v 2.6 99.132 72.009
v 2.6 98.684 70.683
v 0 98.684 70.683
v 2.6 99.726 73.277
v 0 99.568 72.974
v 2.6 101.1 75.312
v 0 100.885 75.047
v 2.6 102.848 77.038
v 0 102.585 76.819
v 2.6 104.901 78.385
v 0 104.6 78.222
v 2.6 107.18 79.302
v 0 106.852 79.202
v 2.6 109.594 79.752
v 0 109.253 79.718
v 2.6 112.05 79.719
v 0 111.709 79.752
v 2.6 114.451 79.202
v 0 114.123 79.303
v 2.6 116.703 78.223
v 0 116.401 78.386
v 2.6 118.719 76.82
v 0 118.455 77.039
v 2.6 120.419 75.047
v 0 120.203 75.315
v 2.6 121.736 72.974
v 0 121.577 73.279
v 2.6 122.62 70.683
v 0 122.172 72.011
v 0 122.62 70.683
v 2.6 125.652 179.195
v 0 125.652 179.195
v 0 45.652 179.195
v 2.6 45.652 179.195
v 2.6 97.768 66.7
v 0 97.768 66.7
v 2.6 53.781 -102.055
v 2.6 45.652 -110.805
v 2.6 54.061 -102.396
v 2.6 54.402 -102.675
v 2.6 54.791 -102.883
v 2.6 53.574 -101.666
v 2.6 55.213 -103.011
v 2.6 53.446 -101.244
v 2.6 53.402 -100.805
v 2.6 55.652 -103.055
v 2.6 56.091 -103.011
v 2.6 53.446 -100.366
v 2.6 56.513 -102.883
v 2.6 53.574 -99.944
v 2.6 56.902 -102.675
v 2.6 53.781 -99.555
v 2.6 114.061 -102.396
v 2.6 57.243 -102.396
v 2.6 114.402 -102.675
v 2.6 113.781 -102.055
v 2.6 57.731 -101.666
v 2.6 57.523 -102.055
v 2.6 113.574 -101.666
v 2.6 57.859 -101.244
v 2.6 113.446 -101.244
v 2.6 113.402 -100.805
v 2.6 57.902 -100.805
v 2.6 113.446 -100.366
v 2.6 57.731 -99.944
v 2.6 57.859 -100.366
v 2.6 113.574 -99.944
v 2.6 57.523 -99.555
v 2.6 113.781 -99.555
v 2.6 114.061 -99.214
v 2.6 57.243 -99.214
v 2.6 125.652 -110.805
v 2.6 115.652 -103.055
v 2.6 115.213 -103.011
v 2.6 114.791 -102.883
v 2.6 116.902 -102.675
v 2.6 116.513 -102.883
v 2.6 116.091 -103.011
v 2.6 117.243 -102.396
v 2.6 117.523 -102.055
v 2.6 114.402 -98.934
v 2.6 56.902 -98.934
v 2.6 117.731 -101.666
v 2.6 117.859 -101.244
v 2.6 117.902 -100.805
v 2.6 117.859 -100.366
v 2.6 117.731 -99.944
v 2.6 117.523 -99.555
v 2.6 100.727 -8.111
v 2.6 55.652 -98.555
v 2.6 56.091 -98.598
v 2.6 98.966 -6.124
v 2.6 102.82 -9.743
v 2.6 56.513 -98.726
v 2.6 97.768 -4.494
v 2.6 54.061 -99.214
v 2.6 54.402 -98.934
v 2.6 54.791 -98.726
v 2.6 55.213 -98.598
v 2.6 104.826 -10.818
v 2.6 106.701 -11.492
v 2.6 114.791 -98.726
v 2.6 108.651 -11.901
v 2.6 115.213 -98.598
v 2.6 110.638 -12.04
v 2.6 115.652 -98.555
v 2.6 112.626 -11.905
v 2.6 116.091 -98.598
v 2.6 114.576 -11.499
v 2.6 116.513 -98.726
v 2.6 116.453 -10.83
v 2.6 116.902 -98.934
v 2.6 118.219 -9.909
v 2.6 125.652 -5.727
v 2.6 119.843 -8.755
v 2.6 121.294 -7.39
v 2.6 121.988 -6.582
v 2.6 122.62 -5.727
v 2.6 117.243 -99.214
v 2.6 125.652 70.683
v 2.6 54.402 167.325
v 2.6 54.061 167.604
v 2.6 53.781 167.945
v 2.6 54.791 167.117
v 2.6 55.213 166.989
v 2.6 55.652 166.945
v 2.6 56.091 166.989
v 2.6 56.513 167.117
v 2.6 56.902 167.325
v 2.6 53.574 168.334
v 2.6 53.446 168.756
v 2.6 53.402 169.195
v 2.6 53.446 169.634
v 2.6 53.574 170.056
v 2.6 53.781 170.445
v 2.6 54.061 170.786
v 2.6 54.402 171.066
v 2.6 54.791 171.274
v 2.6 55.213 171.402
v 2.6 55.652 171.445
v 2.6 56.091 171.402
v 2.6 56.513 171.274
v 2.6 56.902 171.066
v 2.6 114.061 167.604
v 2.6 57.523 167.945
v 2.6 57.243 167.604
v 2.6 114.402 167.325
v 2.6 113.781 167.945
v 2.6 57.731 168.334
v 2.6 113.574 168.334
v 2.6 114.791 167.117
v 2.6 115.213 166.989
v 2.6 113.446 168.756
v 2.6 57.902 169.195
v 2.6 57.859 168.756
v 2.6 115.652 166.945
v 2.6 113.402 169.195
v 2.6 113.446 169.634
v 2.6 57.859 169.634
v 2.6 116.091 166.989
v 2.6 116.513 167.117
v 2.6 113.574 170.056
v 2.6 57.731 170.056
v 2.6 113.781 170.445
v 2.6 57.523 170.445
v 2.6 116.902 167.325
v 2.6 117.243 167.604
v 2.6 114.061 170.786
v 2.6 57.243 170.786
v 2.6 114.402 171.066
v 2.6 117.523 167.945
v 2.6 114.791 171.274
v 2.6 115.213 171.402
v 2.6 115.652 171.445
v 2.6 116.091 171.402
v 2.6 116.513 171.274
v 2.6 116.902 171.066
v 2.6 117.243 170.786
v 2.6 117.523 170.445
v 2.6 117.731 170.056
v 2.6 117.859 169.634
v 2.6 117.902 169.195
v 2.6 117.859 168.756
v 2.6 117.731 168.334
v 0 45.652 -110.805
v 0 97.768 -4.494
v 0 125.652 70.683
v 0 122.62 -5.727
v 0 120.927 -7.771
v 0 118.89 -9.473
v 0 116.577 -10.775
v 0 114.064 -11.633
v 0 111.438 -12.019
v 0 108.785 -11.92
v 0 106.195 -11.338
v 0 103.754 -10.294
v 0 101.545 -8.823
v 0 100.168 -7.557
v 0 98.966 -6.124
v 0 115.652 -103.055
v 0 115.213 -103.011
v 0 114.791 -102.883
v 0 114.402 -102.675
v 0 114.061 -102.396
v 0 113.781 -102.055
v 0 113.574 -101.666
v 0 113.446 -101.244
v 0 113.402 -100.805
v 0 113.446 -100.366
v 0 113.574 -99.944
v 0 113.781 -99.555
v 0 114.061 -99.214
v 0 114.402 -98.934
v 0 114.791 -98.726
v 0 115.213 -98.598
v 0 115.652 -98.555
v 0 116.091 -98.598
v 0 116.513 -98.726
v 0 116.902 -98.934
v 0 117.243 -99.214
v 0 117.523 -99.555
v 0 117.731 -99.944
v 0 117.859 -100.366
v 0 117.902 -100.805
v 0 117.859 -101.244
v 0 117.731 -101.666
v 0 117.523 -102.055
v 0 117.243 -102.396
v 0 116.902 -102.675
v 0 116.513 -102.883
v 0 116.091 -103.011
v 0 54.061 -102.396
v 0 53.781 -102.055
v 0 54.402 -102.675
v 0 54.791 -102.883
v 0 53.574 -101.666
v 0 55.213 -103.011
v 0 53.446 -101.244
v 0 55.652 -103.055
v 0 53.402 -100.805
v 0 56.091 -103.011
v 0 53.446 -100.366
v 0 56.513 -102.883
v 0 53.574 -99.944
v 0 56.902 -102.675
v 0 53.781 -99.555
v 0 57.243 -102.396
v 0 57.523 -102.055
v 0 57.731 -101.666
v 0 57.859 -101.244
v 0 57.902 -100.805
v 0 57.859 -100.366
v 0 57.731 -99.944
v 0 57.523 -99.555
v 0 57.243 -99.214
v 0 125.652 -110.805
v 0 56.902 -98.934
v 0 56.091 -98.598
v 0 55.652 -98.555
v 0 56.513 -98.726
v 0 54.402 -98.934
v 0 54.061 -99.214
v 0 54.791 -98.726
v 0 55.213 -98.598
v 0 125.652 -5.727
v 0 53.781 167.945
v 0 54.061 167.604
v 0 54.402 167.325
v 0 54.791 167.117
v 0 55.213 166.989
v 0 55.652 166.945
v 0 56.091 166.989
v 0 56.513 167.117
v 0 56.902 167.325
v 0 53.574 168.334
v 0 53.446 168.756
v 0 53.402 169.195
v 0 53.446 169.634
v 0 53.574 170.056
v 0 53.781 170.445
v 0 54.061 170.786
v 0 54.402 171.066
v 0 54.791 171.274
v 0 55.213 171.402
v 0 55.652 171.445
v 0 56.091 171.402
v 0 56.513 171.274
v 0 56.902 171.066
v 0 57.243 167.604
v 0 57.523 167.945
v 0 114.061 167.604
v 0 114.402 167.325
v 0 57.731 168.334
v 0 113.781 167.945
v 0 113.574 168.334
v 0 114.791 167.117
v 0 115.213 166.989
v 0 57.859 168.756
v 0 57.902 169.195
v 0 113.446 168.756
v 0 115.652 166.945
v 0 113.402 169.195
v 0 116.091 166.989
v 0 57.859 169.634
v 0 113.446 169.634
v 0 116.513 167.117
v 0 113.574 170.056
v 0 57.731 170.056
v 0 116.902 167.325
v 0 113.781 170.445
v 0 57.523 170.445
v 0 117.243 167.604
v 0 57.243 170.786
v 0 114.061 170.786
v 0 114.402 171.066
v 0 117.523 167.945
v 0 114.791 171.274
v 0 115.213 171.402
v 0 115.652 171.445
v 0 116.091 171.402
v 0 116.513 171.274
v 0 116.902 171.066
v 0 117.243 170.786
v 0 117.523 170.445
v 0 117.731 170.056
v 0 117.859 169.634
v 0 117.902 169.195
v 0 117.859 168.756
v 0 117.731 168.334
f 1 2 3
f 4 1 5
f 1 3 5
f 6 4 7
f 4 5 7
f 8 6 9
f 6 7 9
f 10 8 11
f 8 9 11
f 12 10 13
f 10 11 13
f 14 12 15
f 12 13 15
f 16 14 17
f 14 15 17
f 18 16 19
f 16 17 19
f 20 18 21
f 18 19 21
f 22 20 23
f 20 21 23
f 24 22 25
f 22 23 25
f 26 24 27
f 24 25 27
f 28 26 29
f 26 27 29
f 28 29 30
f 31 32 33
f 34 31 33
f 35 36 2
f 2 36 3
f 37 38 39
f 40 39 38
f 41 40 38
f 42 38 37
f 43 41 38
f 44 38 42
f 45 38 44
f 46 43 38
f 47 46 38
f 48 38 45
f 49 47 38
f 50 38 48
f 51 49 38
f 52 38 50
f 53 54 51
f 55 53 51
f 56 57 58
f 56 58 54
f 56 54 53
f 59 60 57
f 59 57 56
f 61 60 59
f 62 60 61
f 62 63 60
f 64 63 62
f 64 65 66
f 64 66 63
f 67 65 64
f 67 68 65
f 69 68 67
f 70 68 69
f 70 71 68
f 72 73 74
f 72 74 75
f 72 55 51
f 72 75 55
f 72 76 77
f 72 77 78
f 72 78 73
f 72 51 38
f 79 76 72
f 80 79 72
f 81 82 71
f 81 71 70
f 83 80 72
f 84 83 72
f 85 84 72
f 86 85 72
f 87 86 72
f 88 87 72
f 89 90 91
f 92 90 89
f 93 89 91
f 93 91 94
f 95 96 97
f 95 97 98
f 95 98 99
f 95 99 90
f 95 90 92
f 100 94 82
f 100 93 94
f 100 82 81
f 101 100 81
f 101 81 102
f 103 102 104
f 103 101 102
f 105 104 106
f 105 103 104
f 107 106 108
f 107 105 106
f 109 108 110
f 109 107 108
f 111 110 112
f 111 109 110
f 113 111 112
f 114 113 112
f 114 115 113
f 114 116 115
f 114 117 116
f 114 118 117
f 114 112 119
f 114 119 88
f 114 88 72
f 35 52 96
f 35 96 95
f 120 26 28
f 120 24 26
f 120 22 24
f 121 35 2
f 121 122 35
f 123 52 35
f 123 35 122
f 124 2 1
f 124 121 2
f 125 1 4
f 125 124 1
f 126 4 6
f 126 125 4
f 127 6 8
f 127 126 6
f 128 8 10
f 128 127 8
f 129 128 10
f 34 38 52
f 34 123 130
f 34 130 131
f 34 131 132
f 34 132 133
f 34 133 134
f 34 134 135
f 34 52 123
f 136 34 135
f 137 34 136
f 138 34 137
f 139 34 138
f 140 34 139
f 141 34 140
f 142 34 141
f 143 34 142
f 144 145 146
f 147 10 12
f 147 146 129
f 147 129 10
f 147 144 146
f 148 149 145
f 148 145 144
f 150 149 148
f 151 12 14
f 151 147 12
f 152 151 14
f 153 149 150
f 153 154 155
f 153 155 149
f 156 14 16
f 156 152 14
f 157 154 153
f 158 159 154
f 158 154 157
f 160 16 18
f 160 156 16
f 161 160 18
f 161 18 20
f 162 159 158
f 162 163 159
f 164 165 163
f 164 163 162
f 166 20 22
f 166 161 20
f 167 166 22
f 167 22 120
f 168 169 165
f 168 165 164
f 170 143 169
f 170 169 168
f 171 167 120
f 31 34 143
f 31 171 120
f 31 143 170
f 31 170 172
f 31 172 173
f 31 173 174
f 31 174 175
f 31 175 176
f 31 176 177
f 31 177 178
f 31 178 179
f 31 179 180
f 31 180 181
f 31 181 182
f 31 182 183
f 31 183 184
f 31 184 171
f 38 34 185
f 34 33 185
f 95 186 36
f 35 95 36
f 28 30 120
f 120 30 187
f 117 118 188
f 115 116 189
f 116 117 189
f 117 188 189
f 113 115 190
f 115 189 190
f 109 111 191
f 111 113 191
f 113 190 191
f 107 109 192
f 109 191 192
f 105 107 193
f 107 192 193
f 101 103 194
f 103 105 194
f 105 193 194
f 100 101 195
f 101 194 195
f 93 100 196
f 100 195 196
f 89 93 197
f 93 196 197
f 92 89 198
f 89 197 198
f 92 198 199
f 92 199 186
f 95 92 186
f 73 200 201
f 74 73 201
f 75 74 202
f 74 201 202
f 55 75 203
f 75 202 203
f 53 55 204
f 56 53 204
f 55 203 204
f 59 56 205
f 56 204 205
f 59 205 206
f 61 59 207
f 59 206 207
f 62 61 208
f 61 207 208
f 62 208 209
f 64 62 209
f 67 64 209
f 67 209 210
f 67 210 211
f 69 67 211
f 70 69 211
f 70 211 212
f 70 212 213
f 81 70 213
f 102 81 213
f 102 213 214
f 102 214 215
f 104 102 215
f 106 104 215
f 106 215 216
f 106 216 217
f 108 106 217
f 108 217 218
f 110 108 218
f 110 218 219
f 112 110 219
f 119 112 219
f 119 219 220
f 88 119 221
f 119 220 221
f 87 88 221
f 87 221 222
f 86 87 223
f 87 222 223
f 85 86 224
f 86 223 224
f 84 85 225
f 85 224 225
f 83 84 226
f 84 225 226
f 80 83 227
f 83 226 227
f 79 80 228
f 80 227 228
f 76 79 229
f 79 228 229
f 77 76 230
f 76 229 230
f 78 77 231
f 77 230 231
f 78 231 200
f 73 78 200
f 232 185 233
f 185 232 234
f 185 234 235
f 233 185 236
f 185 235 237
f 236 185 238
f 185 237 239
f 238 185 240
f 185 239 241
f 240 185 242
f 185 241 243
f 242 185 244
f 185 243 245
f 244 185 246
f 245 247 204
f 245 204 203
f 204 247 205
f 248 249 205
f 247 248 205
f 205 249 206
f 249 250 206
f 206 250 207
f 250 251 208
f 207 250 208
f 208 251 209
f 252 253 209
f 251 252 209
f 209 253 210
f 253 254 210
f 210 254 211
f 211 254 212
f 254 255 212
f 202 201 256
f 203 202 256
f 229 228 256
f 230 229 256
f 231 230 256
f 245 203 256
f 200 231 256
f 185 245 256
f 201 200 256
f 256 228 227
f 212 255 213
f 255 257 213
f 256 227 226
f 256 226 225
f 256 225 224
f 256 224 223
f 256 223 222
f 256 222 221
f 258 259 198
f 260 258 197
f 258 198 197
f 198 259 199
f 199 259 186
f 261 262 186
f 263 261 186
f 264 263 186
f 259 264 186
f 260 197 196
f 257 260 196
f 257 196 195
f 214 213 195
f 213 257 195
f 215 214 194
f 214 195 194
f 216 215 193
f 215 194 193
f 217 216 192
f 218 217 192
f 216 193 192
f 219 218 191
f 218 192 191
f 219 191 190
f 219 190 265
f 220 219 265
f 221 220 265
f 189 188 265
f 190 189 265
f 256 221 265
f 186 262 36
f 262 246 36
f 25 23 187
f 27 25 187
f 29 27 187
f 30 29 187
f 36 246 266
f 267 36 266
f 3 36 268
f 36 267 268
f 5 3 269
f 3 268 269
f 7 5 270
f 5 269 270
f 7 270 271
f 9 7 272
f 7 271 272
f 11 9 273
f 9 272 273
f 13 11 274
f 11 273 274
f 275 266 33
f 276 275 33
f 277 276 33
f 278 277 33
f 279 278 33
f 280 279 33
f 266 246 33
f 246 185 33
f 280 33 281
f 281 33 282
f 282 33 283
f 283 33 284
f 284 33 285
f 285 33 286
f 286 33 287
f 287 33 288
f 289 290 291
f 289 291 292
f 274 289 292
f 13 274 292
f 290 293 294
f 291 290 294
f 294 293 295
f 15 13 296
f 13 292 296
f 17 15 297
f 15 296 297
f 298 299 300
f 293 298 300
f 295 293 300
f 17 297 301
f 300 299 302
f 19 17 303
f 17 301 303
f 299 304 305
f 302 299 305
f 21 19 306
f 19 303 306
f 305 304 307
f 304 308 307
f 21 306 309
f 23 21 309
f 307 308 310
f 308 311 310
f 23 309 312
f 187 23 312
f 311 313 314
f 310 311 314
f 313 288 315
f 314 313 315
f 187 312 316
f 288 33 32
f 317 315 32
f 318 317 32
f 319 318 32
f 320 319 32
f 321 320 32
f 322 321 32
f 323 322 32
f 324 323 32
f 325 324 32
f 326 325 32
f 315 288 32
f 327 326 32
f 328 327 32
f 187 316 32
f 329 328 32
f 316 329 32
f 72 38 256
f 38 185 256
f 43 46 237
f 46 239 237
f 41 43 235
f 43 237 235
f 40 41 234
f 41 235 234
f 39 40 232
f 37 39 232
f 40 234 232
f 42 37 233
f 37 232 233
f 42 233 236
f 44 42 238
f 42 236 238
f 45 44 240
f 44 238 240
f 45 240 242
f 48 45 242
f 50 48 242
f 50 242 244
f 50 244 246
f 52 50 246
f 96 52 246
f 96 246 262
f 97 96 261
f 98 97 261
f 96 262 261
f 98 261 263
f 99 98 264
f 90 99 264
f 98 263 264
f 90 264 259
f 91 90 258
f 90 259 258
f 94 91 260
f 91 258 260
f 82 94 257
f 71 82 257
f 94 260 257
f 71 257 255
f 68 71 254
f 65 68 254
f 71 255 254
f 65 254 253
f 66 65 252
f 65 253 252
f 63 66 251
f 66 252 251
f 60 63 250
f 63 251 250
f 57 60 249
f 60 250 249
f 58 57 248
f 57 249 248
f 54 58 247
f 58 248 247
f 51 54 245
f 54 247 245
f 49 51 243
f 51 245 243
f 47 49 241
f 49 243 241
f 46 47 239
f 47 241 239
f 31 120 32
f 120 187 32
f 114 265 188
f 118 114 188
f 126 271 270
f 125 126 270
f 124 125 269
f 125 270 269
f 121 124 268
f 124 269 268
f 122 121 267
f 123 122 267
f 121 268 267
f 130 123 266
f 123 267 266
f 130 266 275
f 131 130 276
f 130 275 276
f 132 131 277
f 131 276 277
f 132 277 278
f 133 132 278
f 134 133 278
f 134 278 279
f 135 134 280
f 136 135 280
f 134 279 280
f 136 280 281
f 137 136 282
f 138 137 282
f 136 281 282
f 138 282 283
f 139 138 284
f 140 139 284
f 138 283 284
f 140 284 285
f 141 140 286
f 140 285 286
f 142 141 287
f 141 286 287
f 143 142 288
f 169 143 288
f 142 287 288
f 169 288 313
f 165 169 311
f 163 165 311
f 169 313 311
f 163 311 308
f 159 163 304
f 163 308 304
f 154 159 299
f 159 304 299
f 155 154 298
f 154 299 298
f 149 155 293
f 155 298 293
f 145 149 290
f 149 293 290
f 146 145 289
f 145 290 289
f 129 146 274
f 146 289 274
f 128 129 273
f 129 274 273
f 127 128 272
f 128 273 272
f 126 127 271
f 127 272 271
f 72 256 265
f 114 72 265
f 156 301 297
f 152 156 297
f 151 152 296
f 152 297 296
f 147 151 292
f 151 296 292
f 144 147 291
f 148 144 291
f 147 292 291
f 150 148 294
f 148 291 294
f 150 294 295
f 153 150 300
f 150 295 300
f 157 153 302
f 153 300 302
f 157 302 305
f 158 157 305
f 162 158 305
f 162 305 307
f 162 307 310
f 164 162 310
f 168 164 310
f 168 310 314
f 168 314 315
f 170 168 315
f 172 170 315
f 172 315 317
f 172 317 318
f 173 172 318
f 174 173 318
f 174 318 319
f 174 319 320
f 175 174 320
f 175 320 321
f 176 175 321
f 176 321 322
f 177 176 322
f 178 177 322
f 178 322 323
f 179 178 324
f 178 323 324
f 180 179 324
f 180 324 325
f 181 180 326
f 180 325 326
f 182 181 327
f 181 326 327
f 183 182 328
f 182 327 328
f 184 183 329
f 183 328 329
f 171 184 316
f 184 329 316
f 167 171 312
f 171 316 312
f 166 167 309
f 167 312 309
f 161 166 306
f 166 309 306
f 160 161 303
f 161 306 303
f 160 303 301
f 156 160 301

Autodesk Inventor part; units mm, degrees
ref_plane "YZ Plane" through (0, 0, 0) normal (1, 0, 0) x (0, 1, 0)
ref_plane "XZ Plane" through (0, 0, 0) normal (0, 1, 0) x (-1, 0, 0)
ref_plane "XY Plane" through (0, 0, 0) normal (0, 0, 1) x (1, 0, 0)
sketch "スケッチ1" plane through (0, 0, 0) normal (1, 0, 0) x (0, 1, 0)
  line L0 (125.6523, 179.1954) -> (45.6523, 179.1954)
  line L1 (45.6523, 179.1954) -> (45.6523, -110.8046)
  line L2 (45.6523, -110.8046) -> (125.6523, -110.8046)
  line L3 (125.6523, -110.8046) -> (125.6523, 179.1954)
  point P0 (0, 0)
  dimension "d0" = 80
  dimension "d1" = 290
extrude "押し出し1" add sketch "スケッチ1" along normal blind 2.6
sketch "スケッチ2" plane through (2.6, 0, 0) normal (1, 0, 0) x (0, 0, -1)
  line L0 (-179.1954, 125.6523) -> (-179.1954, 45.6523) projected
  line L1 (-179.1954, 45.6523) -> (110.8046, 45.6523) projected
  line L2 (110.8046, 45.6523) -> (110.8046, 125.6523) projected
  line L3 (110.8046, 125.6523) -> (-179.1954, 125.6523) projected
  line L4 (-34.1954, 85.6523) -> (-34.1954, 125.6523)
  line L5 (110.8046, 125.6523) -> (-179.1954, 125.6523) projected
  line L6 (-34.1954, 85.6523) -> (110.8046, 85.6523)
  point P0 (0, 0)
  point P1 (-169.1954, 115.6523)
  point P2 (100.8046, 115.6523)
  point P3 (-169.1954, 55.6523)
  point P4 (100.8046, 55.6523)
  dimension "d4" = 10
  dimension "d5" = 10
hole "穴1" at (2.6, 115.6523, 169.1954) at (2.6, 115.6523, -100.8046) at (2.6, 55.6523, 169.1954) at (2.6, 55.6523, -100.8046) direction (-1, 0, 0) diameter 4.5 depth 10 tip angle 118
sketch "スケッチ4" plane through (0, 0, 0) normal (-1, 0, 0) x (0, 0, 1)
  ellipse E0 centre (2.4593, 110.6523) end of major axis (2.4593, 125.1521) minor radius 14.4996 (-5.7266, 122.6204) -> (-6.1243, 98.9661) ccw projected
  line L0 (-5.7266, 125.6523) -> (-5.7266, 122.6204) projected
  line L1 (-4.4935, 97.7683) -> (66.6998, 97.7683) projected
  line L2 (66.6998, 97.7683) -> (70.683, 98.6842) projected
  ellipse E1 centre (67.383, 110.6523) end of major axis (67.383, 123.067) minor radius 12.4145 (70.683, 98.6842) -> (70.683, 122.6204) ccw projected
  line L3 (70.683, 122.6204) -> (70.683, 125.6523) projected
  ellipse E2 centre (67.383, 110.6523) end of major axis (67.383, 123.067) minor radius 12.4145 (70.683, 98.6842) -> (70.683, 122.6204) ccw projected
  line L4 (-6.1243, 98.9661) -> (-4.4935, 97.7683) projected
  line L5 (-110.8046, 125.6523) -> (179.1954, 125.6523) projected
  arc A0 (66.6955, 101.0165) -> (66.6955, 120.2881) centre (66.6954, 110.6523) ccw projected
  arc A1 (1.6954, 120.1437) -> (1.6954, 101.1609) centre (1.6954, 110.6523) ccw projected
  line L6 (1.6954, 120.1437) -> (66.6955, 120.2881)
  line L7 (66.6955, 101.0165) -> (1.6954, 101.1609)
  line L8 (1.6954, 120.1437) -> (1.6954, 125.6523)
  line L9 (-110.8046, 125.6523) -> (179.1954, 125.6523) projected
  line L10 (66.6955, 120.2881) -> (66.6955, 125.6523)
  point P0 (0, 0)
extrude "押し出し3" cut sketch "スケッチ4" against normal through all
properties part number "lc_box_side" material "ポリカーボネート、クリア"
